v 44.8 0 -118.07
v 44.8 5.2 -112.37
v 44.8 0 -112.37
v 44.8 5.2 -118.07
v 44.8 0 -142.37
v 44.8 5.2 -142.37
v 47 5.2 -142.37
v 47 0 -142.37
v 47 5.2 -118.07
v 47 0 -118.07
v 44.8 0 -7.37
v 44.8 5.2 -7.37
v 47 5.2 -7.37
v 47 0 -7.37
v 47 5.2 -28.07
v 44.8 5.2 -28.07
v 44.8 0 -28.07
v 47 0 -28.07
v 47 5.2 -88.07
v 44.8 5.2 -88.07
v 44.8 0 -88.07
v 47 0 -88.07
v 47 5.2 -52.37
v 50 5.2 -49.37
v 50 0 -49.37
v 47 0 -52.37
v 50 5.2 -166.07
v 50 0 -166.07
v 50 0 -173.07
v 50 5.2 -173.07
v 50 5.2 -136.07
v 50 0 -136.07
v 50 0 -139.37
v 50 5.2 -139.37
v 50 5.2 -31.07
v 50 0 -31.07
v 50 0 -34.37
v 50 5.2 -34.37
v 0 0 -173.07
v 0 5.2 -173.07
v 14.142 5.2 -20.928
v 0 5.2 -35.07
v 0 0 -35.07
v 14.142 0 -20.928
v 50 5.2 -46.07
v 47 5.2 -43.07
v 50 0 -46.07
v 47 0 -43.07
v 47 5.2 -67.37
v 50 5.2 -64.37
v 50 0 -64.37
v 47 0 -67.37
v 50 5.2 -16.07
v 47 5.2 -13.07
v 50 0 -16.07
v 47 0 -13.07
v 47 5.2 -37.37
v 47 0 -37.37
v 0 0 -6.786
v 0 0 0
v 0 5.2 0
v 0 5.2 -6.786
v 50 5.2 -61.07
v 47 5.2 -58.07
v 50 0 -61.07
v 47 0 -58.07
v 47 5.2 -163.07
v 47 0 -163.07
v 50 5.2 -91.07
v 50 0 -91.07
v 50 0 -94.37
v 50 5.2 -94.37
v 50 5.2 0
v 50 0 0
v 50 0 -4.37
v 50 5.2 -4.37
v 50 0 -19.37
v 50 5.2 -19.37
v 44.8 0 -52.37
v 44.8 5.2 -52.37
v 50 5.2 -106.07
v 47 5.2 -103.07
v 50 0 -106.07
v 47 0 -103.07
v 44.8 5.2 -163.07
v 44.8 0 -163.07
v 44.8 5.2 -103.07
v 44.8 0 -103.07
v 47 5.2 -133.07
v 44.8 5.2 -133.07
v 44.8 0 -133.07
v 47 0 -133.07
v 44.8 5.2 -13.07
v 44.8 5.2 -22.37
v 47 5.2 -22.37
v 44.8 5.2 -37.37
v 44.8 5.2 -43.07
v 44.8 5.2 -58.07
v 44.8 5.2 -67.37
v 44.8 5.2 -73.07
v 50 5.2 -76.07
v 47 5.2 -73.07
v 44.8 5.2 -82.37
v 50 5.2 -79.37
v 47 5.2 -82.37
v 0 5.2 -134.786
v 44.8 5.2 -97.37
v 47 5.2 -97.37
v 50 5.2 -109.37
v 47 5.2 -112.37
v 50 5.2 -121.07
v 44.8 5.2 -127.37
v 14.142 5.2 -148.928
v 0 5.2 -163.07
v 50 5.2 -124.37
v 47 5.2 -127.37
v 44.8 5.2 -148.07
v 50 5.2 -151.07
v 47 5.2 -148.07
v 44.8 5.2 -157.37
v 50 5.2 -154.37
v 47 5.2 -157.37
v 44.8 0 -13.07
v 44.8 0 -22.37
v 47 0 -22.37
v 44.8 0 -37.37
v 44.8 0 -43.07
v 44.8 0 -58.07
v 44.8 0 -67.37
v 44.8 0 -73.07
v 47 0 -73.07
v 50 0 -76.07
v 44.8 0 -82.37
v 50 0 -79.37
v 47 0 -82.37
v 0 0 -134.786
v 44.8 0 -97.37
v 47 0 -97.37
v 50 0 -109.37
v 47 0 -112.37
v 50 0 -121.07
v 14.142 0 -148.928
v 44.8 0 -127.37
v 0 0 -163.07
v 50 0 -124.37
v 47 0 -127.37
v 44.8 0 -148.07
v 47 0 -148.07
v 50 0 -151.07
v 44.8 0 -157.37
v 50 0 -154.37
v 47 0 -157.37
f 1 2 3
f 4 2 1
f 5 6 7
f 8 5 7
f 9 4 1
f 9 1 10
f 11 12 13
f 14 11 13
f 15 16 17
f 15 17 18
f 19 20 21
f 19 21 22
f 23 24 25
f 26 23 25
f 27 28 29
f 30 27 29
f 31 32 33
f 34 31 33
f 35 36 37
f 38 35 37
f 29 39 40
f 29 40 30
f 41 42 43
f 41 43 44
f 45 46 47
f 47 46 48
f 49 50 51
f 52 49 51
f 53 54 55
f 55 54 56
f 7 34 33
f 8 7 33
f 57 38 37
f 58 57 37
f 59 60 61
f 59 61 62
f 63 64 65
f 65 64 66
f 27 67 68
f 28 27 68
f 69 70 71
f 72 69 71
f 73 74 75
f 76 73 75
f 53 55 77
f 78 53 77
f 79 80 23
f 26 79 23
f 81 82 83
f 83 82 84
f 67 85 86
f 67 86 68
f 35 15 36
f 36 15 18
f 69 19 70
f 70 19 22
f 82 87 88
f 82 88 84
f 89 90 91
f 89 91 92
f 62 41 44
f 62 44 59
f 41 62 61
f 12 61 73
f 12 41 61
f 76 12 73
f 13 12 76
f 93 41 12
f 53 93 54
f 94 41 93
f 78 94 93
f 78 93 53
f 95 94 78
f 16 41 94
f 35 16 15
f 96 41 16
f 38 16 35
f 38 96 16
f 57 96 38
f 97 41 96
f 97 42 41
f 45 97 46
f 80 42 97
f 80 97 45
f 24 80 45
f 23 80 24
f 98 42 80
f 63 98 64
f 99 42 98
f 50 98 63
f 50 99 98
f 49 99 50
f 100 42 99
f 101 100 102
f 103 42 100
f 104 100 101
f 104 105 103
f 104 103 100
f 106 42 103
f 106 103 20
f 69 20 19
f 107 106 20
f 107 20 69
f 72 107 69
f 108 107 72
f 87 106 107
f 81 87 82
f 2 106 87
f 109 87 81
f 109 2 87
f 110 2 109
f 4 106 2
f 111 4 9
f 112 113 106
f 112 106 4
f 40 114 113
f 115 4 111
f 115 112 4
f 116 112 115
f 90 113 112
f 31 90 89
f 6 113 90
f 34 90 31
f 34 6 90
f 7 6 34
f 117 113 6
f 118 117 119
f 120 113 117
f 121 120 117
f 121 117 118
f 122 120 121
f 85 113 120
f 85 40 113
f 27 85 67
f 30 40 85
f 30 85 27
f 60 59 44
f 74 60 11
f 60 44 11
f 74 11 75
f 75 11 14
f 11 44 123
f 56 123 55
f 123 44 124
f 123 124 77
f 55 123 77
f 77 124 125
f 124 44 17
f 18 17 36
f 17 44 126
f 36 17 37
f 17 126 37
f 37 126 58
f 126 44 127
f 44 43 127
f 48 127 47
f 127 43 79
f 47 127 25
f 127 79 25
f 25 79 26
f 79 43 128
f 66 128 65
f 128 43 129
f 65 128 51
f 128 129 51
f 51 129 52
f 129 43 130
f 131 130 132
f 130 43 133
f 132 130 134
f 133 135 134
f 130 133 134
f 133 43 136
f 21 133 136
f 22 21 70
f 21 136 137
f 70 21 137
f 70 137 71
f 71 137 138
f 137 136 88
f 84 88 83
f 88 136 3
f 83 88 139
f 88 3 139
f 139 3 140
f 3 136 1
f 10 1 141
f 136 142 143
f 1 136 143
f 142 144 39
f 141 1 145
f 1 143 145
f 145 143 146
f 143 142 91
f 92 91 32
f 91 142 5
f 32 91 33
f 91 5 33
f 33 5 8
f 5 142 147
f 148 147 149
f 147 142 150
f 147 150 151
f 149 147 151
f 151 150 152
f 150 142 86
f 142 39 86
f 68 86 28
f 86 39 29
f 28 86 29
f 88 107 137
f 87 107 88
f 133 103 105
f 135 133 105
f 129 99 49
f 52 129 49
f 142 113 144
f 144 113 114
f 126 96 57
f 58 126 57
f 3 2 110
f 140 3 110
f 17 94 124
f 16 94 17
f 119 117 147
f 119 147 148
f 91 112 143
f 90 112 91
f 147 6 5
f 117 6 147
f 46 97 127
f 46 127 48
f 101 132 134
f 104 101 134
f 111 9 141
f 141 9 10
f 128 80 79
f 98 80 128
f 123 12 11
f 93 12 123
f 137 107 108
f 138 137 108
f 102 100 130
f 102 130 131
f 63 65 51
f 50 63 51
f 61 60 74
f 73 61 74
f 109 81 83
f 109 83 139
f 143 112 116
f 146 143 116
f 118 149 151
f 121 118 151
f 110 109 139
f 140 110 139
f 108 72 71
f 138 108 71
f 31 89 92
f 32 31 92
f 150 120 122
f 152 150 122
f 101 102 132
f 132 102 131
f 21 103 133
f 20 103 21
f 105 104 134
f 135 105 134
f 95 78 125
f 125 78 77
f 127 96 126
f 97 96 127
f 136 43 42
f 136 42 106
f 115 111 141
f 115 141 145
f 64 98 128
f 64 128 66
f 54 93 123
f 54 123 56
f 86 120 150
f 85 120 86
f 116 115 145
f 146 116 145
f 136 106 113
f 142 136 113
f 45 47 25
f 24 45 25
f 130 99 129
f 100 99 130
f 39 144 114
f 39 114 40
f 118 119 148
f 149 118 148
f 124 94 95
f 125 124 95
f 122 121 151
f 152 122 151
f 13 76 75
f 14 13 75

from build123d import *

# Parameters (mm, degrees)
SKETCH1_W                  = 50
SKETCH1_H                  = 173.07
BOSS_EXTRUDE1_DEPTH        = 5.2
CUT_EXTRUDE1_DEPTH         = 6
SKETCH4_W                  = 5.2
SKETCH4_H                  = 5.7
CUT_EXTRUDE2_DEPTH         = 6
CHAMFER1_SIZE              = 3
LPATTERN1_COUNT            = 11
LPATTERN1_PITCH            = 15
CHAMFER1_OF_LPATTERN1_SIZE = 3


with BuildPart() as part:
    # Sketch1 → Boss-Extrude1 (new body)
    with BuildSketch(Plane(origin=(0, 0, 0), x_dir=(1, 0, 0), z_dir=(0, 1, 0))):
        with Locations((25, 86.535)):
            Rectangle(SKETCH1_W, SKETCH1_H)
    extrude(amount=BOSS_EXTRUDE1_DEPTH)

    # Sketch2 → Cut-Extrude1 (cut)
    with BuildSketch(Plane(origin=(0, 5.2, 0), x_dir=(1, 0, 0), z_dir=(0, 1, 0))):
        Polygon((0, 134.785728753), (14.142135624, 148.927864376), (0, 163.07), align=None)
        Polygon((14.142135624, 20.927864376), (0, 6.785728753), (0, 35.07), align=None)
    extrude(amount=-CUT_EXTRUDE1_DEPTH, mode=Mode.SUBTRACT)

    # Sketch4 → Cut-Extrude2 (cut)
    with BuildSketch(Plane(origin=(0, 5.2, 0), x_dir=(1, 0, 0), z_dir=(0, 1, 0))):
        with Locations((47.4, 160.22)):
            Rectangle(SKETCH4_W, SKETCH4_H)
    cut_extrude2 = extrude(amount=-CUT_EXTRUDE2_DEPTH, mode=Mode.SUBTRACT)

    # Chamfer1
    chamfer1_edges = [part.edges().sort_by_distance(p)[0] for p in [
        (50, 2.6, -163.07),
        (50, 2.6, -157.37),
    ]]
    chamfer(chamfer1_edges, length=CHAMFER1_SIZE)

    # LPattern1: Cut-Extrude2 ×11
    with Locations(*[(0, 0, i * LPATTERN1_PITCH) for i in range(1, LPATTERN1_COUNT)]):
        add(cut_extrude2, mode=Mode.SUBTRACT)

    # Chamfer1 of LPattern1
    chamfer1_of_lpattern1_edges = [part.edges().sort_by_distance(p)[0] for p in [
        (50, 2.6, -148.07),
        (50, 2.6, -142.37),
        (50, 2.6, -133.07),
        (50, 2.6, -127.37),
        (50, 2.6, -118.07),
        (50, 2.6, -112.37),
        (50, 2.6, -103.07),
        (50, 2.6, -97.37),
        (50, 2.6, -88.07),
        (50, 2.6, -82.37),
        (50, 2.6, -73.07),
        (50, 2.6, -67.37),
        (50, 2.6, -58.07),
        (50, 2.6, -52.37),
        (50, 2.6, -43.07),
        (50, 2.6, -37.37),
        (50, 2.6, -28.07),
        (50, 2.6, -22.37),
        (50, 2.6, -13.07),
        (50, 2.6, -7.37),
    ]]
    chamfer(chamfer1_of_lpattern1_edges, length=CHAMFER1_OF_LPATTERN1_SIZE)


solid = part.part
